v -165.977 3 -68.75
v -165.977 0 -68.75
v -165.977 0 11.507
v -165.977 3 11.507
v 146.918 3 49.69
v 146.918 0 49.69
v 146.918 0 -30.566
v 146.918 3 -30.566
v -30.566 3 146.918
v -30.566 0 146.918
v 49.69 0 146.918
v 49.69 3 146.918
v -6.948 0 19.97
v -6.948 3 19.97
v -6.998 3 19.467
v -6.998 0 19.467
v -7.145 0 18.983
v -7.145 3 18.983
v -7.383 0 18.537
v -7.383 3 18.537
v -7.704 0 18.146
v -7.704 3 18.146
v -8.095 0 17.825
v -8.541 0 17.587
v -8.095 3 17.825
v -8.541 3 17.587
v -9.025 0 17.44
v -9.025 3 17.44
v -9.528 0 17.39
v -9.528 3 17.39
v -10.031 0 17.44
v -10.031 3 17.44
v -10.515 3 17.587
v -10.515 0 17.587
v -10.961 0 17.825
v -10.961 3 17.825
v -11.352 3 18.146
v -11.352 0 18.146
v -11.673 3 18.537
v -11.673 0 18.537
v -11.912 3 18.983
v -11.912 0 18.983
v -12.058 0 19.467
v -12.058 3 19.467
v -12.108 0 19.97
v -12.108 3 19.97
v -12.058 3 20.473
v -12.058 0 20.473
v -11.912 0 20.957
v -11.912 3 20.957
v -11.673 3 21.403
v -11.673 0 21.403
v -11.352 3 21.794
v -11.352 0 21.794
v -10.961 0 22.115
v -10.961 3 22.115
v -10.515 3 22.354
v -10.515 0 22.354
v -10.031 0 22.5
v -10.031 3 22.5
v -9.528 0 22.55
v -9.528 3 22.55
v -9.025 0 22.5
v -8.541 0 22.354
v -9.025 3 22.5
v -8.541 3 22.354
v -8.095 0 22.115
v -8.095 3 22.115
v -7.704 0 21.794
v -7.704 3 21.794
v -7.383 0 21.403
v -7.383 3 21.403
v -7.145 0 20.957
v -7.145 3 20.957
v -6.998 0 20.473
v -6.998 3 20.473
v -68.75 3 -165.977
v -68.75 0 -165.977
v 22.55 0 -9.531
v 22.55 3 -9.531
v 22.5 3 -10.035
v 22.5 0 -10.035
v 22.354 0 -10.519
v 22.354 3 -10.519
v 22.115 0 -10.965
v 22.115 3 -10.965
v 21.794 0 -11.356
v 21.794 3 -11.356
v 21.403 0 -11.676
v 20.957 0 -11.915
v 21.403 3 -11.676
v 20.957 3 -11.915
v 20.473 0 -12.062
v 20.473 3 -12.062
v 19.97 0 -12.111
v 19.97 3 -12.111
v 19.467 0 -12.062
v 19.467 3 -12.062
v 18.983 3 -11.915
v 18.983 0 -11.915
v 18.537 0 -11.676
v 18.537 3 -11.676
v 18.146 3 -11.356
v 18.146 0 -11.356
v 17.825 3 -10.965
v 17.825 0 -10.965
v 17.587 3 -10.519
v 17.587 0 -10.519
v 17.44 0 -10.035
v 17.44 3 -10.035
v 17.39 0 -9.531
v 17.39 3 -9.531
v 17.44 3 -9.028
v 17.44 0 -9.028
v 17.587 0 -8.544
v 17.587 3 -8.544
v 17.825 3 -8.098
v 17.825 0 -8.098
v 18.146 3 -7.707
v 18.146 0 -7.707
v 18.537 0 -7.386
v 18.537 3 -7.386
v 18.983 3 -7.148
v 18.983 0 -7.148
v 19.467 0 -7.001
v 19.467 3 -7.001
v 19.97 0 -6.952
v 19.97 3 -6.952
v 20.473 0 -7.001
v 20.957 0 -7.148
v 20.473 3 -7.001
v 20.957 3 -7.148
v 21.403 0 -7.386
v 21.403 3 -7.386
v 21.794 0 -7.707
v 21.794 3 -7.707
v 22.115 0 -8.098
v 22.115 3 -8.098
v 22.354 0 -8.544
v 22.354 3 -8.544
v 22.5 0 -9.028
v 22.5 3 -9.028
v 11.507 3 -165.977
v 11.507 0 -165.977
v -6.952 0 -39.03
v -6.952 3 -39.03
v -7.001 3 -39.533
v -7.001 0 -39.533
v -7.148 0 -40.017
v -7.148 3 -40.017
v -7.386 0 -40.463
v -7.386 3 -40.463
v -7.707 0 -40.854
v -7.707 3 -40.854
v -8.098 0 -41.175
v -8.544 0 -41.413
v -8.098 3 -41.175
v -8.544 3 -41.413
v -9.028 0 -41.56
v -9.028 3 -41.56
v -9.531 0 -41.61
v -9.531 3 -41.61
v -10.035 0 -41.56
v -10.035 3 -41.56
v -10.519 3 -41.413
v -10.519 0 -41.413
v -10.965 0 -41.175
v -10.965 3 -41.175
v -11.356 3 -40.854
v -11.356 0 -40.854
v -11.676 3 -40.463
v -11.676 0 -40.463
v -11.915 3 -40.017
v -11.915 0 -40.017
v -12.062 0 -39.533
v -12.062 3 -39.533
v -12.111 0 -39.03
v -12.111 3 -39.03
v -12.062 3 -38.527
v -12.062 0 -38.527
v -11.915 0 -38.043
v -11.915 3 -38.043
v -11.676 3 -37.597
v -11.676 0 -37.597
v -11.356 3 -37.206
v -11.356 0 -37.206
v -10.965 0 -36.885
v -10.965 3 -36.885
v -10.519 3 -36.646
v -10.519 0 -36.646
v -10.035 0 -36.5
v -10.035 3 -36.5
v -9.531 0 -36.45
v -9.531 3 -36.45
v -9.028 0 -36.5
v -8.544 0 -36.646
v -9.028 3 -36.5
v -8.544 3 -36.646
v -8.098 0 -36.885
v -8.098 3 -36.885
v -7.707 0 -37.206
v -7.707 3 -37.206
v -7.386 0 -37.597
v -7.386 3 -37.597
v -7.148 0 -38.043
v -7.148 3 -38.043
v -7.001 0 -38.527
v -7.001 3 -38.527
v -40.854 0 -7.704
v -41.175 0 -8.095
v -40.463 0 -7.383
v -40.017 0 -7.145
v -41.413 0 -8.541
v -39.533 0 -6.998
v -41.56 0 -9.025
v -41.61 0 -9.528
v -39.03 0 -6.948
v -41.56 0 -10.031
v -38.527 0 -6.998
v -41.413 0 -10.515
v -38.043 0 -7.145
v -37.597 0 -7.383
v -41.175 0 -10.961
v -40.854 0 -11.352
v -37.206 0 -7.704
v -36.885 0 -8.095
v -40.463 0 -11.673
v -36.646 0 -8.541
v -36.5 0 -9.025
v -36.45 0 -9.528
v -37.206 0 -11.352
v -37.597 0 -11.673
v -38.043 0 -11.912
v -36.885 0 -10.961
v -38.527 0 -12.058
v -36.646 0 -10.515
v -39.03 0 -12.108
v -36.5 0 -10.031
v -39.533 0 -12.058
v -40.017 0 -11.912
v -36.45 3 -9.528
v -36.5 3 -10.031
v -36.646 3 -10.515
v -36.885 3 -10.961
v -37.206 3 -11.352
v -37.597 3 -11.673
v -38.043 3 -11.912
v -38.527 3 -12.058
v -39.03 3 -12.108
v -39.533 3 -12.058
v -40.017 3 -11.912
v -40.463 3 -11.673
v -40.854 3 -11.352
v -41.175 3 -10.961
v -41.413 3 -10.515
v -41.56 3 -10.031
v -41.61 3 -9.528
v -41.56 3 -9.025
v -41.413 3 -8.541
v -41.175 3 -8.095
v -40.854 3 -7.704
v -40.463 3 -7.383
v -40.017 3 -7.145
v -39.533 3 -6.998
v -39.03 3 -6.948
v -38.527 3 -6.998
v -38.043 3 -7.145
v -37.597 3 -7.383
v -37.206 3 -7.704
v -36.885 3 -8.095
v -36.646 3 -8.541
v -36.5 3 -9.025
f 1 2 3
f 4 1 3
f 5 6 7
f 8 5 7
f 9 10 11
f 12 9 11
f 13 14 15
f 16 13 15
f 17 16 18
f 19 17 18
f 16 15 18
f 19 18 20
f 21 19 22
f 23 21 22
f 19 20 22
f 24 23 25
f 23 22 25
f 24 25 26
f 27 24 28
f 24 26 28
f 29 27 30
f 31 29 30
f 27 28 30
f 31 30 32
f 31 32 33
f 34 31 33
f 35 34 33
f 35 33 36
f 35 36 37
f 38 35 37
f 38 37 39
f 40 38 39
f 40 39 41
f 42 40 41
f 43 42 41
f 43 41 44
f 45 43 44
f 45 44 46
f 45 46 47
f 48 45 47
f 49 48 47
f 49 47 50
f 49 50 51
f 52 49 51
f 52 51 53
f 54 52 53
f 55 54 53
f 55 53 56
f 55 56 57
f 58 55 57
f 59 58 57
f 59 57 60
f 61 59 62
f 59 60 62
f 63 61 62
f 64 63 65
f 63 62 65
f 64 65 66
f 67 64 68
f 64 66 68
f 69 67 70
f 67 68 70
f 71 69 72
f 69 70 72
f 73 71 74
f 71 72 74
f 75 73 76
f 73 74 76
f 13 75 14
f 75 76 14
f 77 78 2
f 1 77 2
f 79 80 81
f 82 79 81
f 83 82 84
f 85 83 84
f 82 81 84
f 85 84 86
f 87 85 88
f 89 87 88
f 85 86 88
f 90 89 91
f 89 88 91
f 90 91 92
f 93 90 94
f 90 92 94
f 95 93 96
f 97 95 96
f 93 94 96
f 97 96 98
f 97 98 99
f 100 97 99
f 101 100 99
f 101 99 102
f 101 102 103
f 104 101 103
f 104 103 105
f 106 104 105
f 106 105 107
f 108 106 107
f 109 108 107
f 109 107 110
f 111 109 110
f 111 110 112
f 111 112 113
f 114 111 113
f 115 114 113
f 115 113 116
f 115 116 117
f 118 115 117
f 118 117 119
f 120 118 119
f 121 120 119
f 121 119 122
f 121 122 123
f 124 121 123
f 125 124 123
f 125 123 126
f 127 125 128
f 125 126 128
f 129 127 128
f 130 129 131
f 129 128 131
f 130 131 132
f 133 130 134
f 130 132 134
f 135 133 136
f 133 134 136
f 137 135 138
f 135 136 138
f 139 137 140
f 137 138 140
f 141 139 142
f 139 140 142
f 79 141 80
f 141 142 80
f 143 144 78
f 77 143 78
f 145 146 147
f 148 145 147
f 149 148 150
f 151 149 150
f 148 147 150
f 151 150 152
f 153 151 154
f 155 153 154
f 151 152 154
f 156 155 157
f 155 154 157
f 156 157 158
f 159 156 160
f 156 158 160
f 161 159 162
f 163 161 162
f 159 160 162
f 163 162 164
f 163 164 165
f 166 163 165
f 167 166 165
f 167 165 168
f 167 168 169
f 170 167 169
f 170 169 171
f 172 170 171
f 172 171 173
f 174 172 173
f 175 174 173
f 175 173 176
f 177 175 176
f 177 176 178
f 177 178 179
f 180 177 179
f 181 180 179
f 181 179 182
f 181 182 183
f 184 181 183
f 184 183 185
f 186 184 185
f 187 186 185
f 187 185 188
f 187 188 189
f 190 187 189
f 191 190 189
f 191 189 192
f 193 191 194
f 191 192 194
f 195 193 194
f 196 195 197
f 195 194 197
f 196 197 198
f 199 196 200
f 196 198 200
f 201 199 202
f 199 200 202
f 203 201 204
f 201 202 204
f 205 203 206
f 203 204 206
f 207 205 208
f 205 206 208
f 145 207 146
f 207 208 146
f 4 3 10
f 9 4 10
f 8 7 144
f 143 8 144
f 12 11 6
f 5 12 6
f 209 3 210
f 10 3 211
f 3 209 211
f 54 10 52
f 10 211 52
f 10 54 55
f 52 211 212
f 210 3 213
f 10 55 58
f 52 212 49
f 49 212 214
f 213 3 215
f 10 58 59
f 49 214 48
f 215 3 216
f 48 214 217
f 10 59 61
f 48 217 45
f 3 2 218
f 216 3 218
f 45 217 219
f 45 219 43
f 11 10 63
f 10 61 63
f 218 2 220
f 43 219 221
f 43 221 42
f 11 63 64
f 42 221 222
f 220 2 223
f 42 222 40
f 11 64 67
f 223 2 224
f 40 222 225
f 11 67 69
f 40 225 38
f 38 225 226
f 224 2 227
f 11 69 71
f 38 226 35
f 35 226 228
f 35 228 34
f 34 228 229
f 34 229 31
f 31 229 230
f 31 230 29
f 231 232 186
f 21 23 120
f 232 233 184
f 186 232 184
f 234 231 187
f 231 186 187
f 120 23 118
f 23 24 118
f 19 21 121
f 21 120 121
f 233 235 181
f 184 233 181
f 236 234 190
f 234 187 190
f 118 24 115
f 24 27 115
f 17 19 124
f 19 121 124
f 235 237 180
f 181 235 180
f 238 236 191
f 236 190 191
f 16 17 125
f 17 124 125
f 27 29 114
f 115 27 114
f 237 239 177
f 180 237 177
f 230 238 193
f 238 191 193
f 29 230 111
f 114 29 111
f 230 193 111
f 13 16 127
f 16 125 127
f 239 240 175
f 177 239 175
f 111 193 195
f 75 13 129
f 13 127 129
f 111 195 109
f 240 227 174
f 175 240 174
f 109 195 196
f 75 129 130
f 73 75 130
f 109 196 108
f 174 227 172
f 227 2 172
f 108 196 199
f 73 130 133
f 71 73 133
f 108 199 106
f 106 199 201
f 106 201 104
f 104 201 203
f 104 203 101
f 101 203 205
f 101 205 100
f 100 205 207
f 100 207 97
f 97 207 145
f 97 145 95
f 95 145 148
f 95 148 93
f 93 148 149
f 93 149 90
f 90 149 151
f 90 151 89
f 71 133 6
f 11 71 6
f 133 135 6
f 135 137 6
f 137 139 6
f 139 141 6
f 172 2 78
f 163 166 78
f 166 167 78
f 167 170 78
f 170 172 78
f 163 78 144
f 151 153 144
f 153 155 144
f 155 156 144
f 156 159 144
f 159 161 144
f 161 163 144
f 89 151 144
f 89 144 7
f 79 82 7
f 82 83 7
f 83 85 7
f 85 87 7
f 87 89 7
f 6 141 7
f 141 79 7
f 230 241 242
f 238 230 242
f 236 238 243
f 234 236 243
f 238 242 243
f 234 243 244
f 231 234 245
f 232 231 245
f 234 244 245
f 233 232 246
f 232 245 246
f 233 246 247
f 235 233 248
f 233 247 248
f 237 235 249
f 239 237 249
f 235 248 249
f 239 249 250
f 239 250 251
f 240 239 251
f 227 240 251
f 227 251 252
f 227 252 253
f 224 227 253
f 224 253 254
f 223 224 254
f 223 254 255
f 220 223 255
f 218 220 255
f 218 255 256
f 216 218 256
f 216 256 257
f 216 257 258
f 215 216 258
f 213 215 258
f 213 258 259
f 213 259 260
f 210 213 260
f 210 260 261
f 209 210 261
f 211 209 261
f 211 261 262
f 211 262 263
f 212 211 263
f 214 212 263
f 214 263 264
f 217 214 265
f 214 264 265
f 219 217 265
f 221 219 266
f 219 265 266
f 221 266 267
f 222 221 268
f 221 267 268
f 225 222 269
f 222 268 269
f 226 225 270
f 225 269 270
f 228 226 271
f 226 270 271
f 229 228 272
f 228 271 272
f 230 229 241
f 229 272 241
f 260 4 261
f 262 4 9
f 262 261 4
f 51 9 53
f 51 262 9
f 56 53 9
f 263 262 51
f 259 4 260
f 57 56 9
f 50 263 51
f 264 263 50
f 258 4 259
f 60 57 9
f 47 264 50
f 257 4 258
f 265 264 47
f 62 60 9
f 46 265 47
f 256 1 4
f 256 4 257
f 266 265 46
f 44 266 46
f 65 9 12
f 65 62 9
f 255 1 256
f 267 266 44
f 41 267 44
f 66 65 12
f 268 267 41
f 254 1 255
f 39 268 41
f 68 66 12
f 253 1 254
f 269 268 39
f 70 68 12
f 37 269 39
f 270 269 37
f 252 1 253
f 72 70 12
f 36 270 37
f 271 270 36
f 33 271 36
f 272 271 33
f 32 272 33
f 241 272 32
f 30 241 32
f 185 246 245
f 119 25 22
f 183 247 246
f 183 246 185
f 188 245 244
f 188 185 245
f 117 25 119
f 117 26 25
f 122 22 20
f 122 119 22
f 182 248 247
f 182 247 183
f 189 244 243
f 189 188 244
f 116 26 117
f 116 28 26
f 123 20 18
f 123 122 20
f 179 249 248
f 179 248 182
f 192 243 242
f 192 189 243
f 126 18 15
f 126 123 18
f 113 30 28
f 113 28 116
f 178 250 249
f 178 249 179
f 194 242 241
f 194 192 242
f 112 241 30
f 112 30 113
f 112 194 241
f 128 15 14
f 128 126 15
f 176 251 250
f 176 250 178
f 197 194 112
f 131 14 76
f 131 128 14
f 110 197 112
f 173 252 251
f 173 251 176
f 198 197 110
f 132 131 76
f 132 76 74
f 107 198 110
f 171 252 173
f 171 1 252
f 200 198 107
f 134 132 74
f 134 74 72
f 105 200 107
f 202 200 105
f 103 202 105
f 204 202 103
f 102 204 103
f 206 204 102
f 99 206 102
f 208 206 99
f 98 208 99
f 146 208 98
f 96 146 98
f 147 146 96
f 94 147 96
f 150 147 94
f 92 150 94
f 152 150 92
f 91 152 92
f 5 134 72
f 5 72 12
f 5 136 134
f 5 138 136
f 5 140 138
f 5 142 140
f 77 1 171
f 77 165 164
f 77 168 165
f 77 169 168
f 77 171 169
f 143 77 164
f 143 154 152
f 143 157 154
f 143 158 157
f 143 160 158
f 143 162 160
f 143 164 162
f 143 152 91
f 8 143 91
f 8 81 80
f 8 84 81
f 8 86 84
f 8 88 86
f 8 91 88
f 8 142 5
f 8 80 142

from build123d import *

# Parameters (mm, degrees)
BOSS_EXTRUDE2_DEPTH              = 3
F_13_64_0_20313_DIAMETER_HOLE1_D = 5.159502


with BuildPart() as part:
    # Sketch3 → Boss-Extrude2 (new body)
    with BuildSketch(Plane(origin=(0, 0, 0), x_dir=(1, 0, 0), z_dir=(0, 1, 0))):
        Polygon((146.917568262, 30.566233816), (11.506619665, 165.977182413), (-68.75, 165.977182413), (-165.977182413, 68.75), (-165.977182413, -11.506619665), (-30.566233816, -146.917568262), (49.690385849, -146.917568262), (146.917568262, -49.690385849), align=None)
    extrude(amount=BOSS_EXTRUDE2_DEPTH)

    # 13/64 (0.20313) Diameter Hole1 (through all)
    with Locations(Plane(origin=(0, 0, 0), x_dir=(-1, 0, 0), z_dir=(0, -1, 0))):
        with Locations((39.029807033, 9.528212544), (9.528212544, -19.970192881), (-19.970192881, 9.531401607), (9.531401607, 39.029807033)):
            Hole(F_13_64_0_20313_DIAMETER_HOLE1_D / 2)


solid = part.part
